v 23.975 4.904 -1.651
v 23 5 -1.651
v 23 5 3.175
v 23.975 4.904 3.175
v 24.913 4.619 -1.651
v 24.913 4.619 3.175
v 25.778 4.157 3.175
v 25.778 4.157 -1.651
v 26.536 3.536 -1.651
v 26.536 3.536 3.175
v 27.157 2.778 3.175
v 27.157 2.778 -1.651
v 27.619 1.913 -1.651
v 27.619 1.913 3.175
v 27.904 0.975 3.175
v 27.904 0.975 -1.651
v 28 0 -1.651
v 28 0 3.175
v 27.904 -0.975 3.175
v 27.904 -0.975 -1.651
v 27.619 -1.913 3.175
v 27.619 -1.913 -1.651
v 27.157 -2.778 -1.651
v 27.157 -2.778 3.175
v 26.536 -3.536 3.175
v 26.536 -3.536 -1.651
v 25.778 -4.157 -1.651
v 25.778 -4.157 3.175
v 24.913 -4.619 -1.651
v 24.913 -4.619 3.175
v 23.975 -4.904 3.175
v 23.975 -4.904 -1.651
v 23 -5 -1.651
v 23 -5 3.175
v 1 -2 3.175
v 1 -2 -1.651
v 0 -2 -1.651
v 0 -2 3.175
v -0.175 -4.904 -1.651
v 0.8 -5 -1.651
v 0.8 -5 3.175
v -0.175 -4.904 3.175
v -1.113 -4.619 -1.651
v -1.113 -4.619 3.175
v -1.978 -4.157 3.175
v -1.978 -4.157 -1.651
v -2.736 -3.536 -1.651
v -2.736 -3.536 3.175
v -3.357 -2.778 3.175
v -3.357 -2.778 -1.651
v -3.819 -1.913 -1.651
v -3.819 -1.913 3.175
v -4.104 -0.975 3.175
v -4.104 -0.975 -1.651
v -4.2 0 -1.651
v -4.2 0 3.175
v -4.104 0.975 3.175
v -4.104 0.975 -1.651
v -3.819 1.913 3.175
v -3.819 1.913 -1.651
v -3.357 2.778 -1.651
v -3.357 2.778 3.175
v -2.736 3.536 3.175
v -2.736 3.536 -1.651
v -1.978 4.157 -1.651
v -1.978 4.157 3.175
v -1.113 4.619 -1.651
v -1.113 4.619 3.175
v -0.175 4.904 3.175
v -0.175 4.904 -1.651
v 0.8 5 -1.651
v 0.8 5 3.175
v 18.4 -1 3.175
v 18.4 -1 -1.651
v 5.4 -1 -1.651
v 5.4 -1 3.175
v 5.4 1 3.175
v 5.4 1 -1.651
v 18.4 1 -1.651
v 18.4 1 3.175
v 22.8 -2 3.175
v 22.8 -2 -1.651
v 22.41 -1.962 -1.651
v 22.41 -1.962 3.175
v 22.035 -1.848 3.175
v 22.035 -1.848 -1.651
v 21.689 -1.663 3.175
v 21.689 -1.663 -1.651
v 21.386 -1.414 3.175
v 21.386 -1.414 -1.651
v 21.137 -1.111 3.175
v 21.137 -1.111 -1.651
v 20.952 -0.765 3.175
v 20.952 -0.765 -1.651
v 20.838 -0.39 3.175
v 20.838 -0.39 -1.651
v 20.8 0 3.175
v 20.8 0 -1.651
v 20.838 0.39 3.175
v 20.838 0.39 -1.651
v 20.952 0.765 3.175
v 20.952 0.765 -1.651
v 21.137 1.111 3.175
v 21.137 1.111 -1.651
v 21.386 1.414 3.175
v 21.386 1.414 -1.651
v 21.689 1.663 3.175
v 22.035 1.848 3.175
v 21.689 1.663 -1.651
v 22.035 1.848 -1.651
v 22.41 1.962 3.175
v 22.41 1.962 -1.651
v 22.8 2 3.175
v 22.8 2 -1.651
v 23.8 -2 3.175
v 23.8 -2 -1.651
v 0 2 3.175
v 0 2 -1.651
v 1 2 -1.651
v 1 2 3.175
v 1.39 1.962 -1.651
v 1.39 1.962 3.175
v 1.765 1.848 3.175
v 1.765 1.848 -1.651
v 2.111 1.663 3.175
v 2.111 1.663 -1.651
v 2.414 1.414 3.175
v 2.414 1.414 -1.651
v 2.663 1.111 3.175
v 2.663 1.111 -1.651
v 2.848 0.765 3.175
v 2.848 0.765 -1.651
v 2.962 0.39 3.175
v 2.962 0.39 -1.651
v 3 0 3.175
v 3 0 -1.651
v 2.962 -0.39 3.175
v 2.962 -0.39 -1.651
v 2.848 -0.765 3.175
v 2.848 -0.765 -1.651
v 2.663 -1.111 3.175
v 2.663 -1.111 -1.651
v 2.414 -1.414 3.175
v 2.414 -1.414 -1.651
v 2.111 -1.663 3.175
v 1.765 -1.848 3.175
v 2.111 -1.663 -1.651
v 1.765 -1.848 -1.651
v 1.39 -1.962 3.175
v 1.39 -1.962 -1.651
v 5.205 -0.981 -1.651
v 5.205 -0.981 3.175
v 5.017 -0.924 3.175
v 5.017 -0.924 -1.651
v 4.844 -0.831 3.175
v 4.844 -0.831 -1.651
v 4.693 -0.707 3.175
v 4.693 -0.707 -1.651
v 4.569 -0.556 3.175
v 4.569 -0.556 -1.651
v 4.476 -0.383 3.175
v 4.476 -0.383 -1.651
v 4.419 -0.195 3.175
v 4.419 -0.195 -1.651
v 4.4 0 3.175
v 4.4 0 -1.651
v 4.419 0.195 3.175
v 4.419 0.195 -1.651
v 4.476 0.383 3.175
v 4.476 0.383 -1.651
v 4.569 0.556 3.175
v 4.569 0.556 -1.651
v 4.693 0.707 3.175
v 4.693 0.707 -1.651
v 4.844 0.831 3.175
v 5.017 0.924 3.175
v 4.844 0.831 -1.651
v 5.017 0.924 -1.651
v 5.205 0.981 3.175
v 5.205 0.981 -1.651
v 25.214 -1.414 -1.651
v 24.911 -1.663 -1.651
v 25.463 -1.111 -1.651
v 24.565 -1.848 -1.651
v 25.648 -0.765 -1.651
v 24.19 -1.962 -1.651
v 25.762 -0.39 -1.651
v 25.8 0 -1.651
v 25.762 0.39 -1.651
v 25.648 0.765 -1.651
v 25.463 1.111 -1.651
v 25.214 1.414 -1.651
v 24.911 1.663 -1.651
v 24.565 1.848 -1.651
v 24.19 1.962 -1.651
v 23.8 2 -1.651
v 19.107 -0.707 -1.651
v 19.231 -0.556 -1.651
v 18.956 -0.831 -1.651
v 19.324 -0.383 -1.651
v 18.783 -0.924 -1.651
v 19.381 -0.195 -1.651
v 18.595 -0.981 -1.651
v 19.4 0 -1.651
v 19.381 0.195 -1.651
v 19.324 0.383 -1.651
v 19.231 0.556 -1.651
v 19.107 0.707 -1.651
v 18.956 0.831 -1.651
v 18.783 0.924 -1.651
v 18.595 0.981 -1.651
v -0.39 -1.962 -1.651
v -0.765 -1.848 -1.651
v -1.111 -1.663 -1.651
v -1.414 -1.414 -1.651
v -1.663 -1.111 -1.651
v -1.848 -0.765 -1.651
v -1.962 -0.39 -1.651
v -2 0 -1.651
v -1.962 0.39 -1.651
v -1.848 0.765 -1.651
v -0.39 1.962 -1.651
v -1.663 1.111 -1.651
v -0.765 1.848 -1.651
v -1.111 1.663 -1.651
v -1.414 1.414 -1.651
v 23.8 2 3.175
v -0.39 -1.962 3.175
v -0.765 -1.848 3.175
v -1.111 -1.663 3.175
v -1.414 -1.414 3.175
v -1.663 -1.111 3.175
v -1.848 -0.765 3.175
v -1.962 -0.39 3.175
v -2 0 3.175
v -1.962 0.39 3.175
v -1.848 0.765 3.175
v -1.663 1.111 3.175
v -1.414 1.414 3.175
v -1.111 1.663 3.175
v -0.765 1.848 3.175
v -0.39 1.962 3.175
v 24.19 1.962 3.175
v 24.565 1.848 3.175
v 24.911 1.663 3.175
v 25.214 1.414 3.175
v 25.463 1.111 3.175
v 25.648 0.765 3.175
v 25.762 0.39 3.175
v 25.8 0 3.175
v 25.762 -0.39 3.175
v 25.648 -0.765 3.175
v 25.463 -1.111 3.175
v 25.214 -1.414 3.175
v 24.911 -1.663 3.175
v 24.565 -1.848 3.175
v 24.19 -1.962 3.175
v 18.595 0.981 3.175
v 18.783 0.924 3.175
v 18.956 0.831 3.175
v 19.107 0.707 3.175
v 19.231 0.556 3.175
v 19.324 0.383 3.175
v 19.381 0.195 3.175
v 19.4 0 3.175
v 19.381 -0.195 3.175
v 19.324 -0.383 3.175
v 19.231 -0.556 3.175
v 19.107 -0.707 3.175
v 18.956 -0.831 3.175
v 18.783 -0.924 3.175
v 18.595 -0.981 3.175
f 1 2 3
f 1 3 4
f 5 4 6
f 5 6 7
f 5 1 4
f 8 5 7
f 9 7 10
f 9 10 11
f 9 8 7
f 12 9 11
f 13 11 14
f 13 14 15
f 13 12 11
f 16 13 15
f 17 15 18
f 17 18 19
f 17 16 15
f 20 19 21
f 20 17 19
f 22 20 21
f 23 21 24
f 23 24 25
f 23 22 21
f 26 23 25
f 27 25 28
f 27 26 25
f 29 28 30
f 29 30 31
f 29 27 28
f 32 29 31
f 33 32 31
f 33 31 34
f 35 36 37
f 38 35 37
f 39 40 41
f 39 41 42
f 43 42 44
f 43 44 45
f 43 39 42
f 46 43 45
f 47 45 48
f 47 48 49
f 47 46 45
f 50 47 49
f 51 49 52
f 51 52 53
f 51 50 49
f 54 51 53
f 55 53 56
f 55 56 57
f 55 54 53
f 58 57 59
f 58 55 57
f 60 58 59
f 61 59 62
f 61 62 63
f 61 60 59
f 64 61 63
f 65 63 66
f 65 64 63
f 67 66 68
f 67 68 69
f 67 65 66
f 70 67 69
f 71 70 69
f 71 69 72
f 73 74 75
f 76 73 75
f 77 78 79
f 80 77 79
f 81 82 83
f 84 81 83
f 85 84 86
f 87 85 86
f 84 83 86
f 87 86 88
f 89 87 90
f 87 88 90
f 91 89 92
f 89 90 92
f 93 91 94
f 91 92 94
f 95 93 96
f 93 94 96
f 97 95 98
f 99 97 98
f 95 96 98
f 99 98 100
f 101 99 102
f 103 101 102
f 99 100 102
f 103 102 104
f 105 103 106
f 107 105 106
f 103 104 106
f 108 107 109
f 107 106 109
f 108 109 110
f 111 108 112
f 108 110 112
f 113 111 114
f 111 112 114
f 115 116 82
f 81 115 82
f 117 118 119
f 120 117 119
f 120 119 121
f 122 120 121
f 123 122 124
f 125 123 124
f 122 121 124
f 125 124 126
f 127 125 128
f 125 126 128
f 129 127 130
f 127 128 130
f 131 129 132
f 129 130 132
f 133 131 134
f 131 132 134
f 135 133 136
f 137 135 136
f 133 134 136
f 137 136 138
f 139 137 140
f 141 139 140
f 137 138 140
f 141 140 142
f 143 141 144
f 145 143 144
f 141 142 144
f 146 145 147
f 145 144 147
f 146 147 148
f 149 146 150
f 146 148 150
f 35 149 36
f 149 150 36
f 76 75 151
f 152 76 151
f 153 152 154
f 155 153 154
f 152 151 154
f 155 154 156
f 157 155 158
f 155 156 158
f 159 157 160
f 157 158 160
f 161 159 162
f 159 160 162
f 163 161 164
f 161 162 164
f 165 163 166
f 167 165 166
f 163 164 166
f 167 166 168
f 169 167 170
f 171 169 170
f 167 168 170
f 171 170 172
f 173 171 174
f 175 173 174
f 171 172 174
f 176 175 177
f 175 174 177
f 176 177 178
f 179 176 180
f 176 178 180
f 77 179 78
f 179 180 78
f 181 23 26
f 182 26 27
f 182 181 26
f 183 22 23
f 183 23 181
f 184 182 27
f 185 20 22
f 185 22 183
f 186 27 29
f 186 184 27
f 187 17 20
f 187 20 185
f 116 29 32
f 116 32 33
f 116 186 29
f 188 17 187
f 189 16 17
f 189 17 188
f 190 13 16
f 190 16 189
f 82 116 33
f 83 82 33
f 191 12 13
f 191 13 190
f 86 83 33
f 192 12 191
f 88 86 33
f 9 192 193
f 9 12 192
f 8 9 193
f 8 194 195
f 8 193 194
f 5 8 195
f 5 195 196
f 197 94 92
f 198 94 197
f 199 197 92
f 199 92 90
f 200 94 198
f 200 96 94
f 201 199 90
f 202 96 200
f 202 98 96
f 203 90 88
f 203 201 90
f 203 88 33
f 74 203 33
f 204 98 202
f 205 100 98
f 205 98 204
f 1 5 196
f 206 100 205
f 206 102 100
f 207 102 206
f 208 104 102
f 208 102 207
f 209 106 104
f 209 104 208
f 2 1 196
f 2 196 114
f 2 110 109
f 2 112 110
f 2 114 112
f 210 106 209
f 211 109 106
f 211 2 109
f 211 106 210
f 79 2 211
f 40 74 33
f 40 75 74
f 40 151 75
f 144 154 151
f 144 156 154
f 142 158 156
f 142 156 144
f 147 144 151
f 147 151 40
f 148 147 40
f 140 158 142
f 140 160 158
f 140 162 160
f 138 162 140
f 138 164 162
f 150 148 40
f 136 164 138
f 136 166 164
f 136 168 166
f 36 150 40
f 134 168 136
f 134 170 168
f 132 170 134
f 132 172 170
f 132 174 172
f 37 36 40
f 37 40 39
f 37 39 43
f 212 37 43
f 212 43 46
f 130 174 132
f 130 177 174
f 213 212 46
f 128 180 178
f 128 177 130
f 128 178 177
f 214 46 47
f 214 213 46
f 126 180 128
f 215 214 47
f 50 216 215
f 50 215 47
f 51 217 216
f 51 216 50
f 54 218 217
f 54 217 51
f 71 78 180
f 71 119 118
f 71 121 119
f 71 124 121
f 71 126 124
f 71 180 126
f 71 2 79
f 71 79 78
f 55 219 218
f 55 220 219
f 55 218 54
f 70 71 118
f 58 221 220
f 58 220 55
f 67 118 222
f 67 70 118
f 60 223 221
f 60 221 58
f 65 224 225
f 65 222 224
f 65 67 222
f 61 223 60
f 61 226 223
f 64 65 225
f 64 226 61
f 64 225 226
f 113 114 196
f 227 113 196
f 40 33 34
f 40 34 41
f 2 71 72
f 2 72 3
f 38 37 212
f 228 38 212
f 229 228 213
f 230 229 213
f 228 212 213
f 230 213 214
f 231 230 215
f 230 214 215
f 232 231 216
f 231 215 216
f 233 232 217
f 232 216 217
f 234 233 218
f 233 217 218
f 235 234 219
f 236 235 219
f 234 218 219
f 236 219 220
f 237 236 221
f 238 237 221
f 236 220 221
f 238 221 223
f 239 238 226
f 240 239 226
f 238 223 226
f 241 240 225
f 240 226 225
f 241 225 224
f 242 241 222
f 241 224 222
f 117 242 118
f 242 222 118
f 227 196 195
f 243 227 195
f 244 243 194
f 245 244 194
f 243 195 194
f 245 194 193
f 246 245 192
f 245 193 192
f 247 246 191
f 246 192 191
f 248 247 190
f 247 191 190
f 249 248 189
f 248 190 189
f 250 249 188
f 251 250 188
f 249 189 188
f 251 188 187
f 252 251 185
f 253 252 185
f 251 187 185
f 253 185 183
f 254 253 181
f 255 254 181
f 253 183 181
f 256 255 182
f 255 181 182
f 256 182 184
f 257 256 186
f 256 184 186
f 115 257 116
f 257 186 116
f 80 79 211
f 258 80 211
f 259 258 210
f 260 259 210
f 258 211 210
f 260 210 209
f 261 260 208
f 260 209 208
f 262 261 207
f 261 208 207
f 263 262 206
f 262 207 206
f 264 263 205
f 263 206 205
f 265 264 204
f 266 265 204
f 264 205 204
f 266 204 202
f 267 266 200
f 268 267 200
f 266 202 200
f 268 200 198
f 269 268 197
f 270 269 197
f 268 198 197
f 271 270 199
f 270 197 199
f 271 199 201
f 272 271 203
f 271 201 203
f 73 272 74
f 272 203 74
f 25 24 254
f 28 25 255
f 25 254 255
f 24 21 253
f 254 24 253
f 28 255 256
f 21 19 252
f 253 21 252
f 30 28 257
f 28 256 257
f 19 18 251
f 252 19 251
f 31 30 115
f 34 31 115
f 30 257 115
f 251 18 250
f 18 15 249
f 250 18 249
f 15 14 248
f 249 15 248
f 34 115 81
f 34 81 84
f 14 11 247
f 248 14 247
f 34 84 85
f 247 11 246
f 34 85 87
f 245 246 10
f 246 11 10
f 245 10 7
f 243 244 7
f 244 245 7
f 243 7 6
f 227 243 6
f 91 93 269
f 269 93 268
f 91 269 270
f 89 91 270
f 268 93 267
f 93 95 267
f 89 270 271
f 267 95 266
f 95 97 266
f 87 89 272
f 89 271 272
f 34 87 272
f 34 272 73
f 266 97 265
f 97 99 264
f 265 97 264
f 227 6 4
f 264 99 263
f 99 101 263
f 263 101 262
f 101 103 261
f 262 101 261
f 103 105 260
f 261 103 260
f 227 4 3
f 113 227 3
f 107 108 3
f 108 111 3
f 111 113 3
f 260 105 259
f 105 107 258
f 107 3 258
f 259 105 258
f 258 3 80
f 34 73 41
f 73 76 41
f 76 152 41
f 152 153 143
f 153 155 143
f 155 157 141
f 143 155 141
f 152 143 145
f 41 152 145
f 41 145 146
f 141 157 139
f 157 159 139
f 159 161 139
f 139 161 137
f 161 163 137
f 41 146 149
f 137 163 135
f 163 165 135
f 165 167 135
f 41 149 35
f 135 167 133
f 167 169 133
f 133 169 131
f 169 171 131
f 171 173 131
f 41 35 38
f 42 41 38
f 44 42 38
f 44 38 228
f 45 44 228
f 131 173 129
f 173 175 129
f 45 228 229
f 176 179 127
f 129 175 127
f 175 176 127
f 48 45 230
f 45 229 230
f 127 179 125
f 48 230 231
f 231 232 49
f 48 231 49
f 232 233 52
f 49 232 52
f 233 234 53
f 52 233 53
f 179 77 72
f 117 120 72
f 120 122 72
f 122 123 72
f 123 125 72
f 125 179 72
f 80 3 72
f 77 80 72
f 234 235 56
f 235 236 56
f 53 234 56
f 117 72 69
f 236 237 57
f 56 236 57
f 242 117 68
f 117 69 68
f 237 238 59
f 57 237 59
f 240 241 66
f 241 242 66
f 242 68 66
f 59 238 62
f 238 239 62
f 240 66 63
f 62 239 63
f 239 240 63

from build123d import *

# Parameters (mm, degrees)
BOSS_EXTRUDE1_DEPTH      = 3.175
BOSS_EXTRUDE1_DEPTH_BACK = 1.651


with BuildPart() as part:
    # Sketch1 → Boss-Extrude1 (new, two sides: drawn at the far end of the back side and taken through both)
    with BuildSketch(Plane.XY.offset(-BOSS_EXTRUDE1_DEPTH_BACK)):
        with BuildLine():
            Line((0.8, 5), (23, 5))
            ThreePointArc((23, 5), (28, 0), (23, -5))
            Line((23, -5), (0.8, -5))
            ThreePointArc((0.8, -5), (-4.2, 0), (0.8, 5))
        make_face()
        with BuildLine():
            Line((0, 2), (1, 2))
            ThreePointArc((1, 2), (3, 0), (1, -2))
            Line((1, -2), (0, -2))
            ThreePointArc((0, -2), (-2, 0), (0, 2))
        make_face(mode=Mode.SUBTRACT)
        with BuildLine():
            Line((22.8, 2), (23.8, 2))
            ThreePointArc((23.8, 2), (25.8, 0), (23.8, -2))
            Line((23.8, -2), (22.8, -2))
            ThreePointArc((22.8, -2), (20.8, 0), (22.8, 2))
        make_face(mode=Mode.SUBTRACT)
        with BuildLine():
            Line((18.4, -1), (5.4, -1))
            ThreePointArc((5.4, -1), (4.4, 0), (5.4, 1))
            Line((5.4, 1), (18.4, 1))
            ThreePointArc((18.4, 1), (19.4, 0), (18.4, -1))
        make_face(mode=Mode.SUBTRACT)
    extrude(amount=BOSS_EXTRUDE1_DEPTH + BOSS_EXTRUDE1_DEPTH_BACK)


solid = part.part
